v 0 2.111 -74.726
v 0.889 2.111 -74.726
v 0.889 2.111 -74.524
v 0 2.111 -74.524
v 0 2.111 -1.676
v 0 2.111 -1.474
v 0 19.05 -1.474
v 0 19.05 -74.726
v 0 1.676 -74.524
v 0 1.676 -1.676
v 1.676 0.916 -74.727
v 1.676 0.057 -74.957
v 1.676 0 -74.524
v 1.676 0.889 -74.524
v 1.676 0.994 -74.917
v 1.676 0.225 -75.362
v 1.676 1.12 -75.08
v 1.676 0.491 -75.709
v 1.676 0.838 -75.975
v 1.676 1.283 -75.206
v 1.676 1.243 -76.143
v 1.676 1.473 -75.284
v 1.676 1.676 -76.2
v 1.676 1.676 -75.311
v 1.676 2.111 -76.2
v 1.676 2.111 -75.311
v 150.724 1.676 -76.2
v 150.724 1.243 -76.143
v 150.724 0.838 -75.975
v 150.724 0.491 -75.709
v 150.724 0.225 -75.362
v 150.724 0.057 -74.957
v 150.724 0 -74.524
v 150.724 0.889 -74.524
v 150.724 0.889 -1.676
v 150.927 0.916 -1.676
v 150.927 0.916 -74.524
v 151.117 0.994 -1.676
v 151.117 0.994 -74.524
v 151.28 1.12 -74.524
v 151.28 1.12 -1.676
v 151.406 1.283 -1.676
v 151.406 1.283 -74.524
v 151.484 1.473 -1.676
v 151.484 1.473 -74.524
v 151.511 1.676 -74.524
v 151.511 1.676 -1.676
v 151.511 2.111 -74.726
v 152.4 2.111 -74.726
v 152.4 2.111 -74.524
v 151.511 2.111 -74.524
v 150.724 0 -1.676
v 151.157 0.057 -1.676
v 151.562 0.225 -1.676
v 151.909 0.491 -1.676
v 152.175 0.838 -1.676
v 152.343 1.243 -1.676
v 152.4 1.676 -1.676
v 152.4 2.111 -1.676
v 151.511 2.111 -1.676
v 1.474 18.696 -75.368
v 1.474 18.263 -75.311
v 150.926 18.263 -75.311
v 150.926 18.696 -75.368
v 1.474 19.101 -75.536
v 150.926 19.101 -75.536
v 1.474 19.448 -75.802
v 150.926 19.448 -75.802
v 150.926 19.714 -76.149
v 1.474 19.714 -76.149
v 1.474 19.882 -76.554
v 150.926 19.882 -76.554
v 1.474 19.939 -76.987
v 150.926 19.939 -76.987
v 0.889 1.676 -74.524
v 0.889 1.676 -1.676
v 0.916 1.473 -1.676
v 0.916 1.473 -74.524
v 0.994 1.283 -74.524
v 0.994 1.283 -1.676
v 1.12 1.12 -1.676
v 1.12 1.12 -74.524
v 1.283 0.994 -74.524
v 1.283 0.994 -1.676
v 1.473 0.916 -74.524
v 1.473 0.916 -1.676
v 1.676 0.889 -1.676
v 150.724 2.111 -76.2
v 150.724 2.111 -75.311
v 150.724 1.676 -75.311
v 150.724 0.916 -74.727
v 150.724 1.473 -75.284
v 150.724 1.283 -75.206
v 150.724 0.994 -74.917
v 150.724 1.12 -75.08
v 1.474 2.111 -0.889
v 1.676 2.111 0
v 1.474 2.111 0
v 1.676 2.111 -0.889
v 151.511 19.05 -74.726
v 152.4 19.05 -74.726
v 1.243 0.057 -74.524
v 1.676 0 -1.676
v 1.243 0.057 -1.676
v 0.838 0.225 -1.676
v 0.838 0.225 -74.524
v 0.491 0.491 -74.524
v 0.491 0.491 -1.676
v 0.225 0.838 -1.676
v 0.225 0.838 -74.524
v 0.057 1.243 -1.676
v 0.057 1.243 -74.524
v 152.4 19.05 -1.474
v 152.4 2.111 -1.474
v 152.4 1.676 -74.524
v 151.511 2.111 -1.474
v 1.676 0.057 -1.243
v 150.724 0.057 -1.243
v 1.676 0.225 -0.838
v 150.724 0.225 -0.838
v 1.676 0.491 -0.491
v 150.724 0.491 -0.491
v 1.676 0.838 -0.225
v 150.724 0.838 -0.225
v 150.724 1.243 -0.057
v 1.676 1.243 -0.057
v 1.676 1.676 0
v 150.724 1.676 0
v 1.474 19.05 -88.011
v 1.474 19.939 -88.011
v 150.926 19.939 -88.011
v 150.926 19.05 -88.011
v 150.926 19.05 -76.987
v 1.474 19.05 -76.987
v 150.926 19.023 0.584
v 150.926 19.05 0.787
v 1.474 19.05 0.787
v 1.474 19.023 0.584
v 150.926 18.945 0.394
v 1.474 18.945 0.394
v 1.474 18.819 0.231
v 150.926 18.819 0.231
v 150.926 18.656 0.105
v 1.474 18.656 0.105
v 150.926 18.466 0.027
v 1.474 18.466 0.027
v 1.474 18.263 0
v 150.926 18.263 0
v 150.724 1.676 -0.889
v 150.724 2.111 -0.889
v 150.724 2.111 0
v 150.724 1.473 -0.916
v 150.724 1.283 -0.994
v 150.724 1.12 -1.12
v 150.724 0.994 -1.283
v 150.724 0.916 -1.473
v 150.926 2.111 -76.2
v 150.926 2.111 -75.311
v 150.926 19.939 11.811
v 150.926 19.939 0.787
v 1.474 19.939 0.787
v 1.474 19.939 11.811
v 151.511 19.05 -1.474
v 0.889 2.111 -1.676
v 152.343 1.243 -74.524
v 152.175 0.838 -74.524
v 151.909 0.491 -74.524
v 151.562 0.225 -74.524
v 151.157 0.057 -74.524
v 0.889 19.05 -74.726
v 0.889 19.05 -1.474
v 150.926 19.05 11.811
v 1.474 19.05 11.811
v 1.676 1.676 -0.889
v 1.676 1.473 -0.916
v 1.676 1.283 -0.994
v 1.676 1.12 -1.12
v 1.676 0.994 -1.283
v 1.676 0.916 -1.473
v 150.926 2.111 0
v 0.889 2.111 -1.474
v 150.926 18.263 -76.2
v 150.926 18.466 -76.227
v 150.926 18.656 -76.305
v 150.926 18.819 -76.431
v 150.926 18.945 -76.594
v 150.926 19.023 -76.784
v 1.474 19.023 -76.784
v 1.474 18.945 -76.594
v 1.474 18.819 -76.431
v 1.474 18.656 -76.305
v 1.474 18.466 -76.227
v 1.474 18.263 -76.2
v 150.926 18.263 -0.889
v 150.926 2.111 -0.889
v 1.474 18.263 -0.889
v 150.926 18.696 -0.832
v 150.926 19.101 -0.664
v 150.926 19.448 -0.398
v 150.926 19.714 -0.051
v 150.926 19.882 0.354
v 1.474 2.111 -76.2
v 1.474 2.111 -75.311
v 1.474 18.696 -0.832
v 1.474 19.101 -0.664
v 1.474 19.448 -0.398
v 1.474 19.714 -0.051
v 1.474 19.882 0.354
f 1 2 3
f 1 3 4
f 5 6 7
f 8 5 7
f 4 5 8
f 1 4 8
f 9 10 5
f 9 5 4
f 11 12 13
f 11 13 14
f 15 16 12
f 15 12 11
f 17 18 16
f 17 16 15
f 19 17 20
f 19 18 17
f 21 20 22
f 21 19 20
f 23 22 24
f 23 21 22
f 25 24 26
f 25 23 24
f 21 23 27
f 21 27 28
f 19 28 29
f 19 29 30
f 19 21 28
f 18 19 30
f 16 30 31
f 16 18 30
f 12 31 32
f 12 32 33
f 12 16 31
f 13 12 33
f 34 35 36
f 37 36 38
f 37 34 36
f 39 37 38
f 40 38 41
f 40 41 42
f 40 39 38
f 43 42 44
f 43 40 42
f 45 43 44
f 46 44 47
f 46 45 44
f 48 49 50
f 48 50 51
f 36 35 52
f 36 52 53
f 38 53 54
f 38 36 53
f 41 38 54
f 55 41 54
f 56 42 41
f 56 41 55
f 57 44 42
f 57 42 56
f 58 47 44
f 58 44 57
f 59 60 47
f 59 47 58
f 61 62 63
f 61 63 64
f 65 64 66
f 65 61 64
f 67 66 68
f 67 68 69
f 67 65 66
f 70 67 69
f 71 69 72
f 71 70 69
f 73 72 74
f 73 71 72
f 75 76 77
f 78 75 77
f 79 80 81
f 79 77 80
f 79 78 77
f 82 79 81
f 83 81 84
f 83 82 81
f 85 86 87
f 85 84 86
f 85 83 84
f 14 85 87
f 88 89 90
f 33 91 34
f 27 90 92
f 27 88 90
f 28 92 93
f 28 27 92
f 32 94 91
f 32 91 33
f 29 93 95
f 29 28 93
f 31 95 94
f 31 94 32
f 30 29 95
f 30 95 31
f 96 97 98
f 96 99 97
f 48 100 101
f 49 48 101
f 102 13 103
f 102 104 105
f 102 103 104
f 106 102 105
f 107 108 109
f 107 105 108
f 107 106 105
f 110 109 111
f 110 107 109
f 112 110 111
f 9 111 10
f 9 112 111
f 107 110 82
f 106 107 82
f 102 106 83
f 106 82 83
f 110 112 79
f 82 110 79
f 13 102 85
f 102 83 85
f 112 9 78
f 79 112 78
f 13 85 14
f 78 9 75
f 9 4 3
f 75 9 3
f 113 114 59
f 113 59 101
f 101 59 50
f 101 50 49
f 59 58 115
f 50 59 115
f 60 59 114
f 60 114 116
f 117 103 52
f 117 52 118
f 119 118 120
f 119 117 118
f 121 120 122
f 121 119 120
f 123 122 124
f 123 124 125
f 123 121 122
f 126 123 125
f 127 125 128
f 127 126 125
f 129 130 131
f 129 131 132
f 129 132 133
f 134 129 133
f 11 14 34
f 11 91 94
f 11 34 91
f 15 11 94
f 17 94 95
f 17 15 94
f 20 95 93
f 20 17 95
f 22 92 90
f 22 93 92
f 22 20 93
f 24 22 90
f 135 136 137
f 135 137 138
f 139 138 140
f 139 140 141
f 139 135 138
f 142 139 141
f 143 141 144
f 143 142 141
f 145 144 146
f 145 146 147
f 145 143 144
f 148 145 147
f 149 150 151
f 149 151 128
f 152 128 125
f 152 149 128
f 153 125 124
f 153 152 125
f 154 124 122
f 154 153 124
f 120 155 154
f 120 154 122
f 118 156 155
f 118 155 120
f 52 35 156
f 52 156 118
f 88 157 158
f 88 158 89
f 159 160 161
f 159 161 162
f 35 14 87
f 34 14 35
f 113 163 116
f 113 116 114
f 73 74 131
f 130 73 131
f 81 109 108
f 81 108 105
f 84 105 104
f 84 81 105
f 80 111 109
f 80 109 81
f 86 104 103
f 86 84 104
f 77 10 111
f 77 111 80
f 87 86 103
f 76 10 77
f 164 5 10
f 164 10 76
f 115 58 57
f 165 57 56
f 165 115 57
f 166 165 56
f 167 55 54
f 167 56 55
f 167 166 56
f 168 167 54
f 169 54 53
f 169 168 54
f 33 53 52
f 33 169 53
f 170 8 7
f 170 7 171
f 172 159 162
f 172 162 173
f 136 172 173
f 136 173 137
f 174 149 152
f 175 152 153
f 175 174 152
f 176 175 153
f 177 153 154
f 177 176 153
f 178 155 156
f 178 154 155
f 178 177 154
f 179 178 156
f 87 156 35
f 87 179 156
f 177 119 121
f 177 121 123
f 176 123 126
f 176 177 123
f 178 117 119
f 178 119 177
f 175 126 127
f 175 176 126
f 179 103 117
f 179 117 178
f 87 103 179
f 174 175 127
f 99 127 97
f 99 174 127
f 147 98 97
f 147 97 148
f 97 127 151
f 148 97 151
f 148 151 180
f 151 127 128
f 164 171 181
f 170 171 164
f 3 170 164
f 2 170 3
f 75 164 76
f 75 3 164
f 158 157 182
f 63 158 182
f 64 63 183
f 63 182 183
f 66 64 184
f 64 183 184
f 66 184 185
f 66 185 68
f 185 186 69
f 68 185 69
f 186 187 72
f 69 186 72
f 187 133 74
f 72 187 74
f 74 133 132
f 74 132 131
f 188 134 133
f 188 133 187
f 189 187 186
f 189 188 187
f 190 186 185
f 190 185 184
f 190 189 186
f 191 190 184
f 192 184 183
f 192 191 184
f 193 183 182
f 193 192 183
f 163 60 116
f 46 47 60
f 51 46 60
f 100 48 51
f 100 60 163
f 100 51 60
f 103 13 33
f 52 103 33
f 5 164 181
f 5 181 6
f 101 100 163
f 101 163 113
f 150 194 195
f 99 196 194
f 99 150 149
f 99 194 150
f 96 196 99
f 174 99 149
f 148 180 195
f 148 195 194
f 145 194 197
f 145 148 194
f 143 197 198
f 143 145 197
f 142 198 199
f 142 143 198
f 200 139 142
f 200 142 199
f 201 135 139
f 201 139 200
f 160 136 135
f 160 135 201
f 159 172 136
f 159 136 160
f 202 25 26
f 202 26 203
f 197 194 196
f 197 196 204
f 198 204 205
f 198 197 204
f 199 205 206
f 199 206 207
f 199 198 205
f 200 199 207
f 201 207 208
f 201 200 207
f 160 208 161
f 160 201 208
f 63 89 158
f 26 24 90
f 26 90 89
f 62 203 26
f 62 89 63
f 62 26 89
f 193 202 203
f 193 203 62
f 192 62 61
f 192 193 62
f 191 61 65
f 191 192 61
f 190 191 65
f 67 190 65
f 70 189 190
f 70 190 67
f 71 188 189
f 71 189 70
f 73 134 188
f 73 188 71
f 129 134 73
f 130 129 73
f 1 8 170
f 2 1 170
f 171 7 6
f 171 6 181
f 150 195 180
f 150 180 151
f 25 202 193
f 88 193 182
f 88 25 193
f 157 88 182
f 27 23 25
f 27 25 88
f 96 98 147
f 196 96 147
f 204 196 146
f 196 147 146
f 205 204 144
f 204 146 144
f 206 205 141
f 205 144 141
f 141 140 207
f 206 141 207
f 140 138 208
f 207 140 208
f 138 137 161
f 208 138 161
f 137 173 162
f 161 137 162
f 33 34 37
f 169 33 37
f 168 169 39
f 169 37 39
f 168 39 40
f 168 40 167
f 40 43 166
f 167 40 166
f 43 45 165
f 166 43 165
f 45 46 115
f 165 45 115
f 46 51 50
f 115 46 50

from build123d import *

# Parameters (mm, degrees)
SKETCH1_W                      = 152.4
SKETCH1_H                      = 76.2
BOSS_EXTRUDE1_DEPTH            = 19.05
CONVERT_SOLID1_START           = -74.5236
CONVERT_SOLID1_DEPTH           = 72.8472
CONVERT_SOLID1_START_2         = -77
CONVERT_SOLID1_2_DEPTH         = 2.273736392
CONVERT_SOLID1_START_3         = -1.473736392
CONVERT_SOLID1_3_DEPTH         = 2.473736392
CONVERT_SOLID1_START_4         = -74.726263608
CONVERT_SOLID1_4_DEPTH         = 73.252527216
CONVERT_SOLID1_5_DEPTH         = 0.202663608
CONVERT_SOLID1_START_5         = -1.6764
CONVERT_SOLID1_6_DEPTH         = 0.202663608
CONVERT_SOLID1_START_6         = 1.473736392
CONVERT_SOLID1_7_DEPTH         = 149.452527216
EDGE_FLANGE1_STRIP_W           = 5.1308
EDGE_FLANGE1_STRIP_H           = 0.889
EDGE_FLANGE1_STRIP_CUT_DEPTH   = 149.452527217
EDGE_FLANGE1_STRIP_2_W         = 5.1308
EDGE_FLANGE1_STRIP_2_H         = 0.889
EDGE_FLANGE1_STRIP_CUT_2_DEPTH = 149.452527217
EDGE_FLANGE1_DEPTH             = 149.452527217
EDGE_FLANGE1_BEND_DEPTH        = 149.452527217


with BuildPart() as part:
    # Sketch1 → Boss-Extrude1 (new body)
    with BuildSketch(Plane(origin=(0, 0, 0), x_dir=(1, 0, 0), z_dir=(0, 1, 0))):
        with Locations((76.2, 38.1)):
            Rectangle(SKETCH1_W, SKETCH1_H)
    extrude(amount=BOSS_EXTRUDE1_DEPTH)

    # Convert-Solid1: read off the stored shape, not the designer's step
    # Convert-Solid1 outline → Convert-Solid1 (cut)
    with BuildSketch(Plane.XY.offset(CONVERT_SOLID1_START)):
        with BuildLine():
            Line((151.511, 19.05), (0.889, 19.05))
            Line((0.889, 19.05), (0.889, 1.6764))
            ThreePointArc((0.889, 1.6764), (1.11962412, 1.11962412), (1.6764, 0.889))
            Line((1.6764, 0.889), (150.7236, 0.889))
            ThreePointArc((150.7236, 0.889), (151.28037588, 1.11962412), (151.511, 1.6764))
            Line((151.511, 1.6764), (151.511, 19.05))
        make_face()
        with BuildLine():
            ThreePointArc((152.4, 1.6764), (151.908993808, 0.491006192), (150.7236, 0))
            Line((150.7236, 0), (152.4, 0))
            Line((152.4, 0), (152.4, 1.6764))
        make_face()
        with BuildLine():
            Line((0, 0), (1.6764, 0))
            ThreePointArc((1.6764, 0), (0.491006192, 0.491006192), (0, 1.6764))
            Line((0, 1.6764), (0, 0))
        make_face()
    extrude(amount=CONVERT_SOLID1_DEPTH, mode=Mode.SUBTRACT)

    # Convert-Solid1 2 outline → Convert-Solid1 2 (cut)
    with BuildSketch(Plane.XY.offset(CONVERT_SOLID1_START_2)):
        Polygon((150.926263608, 2.11106664), (150.7236, 2.11106664), (150.7236, 0), (152.4, 0), (152.4, 19.05), (150.926263608, 19.05), align=None)
        Polygon((1.473736392, 19.05), (0, 19.05), (0, 0), (1.6764, 0), (1.6764, 2.11106664), (1.473736392, 2.11106664), align=None)
    extrude(amount=CONVERT_SOLID1_2_DEPTH, mode=Mode.SUBTRACT)

    # Convert-Solid1 3 outline → Convert-Solid1 3 (cut)
    with BuildSketch(Plane.XY.offset(CONVERT_SOLID1_START_3)):
        Polygon((150.926263608, 2.11106664), (150.7236, 2.11106664), (150.7236, 0), (152.4, 0), (152.4, 19.05), (150.926263608, 19.05), align=None)
        Polygon((1.473736392, 19.05), (0, 19.05), (0, 0), (1.6764, 0), (1.6764, 2.11106664), (1.473736392, 2.11106664), align=None)
    extrude(amount=CONVERT_SOLID1_3_DEPTH, mode=Mode.SUBTRACT)

    # Convert-Solid1 4 outline → Convert-Solid1 4 (cut)
    with BuildSketch(Plane.XY.offset(CONVERT_SOLID1_START_4)):
        with BuildLine():
            Line((150.926263608, 2.11106664), (150.7236, 2.11106664))
            Line((150.7236, 2.11106664), (150.7236, 0.889))
            ThreePointArc((150.7236, 0.889), (151.28037588, 1.11962412), (151.511, 1.6764))
            Line((151.511, 1.6764), (151.511, 19.05))
            Line((151.511, 19.05), (150.926263608, 19.05))
            Line((150.926263608, 19.05), (150.926263608, 2.11106664))
        make_face()
        with BuildLine():
            ThreePointArc((152.4, 1.6764), (151.908993808, 0.491006192), (150.7236, 0))
            Line((150.7236, 0), (152.4, 0))
            Line((152.4, 0), (152.4, 1.6764))
        make_face()
        with BuildLine():
            ThreePointArc((0.889, 1.6764), (1.11962412, 1.11962412), (1.6764, 0.889))
            Line((1.6764, 0.889), (1.6764, 2.11106664))
            Line((1.6764, 2.11106664), (1.473736392, 2.11106664))
            Line((1.473736392, 2.11106664), (1.473736392, 19.05))
            Line((1.473736392, 19.05), (0.889, 19.05))
            Line((0.889, 19.05), (0.889, 1.6764))
        make_face()
        with BuildLine():
            Line((0, 0), (1.6764, 0))
            ThreePointArc((1.6764, 0), (0.491006192, 0.491006192), (0, 1.6764))
            Line((0, 1.6764), (0, 0))
        make_face()
    extrude(amount=CONVERT_SOLID1_4_DEPTH, mode=Mode.SUBTRACT)

    # Convert-Solid1 5 outline → Convert-Solid1 5 (cut)
    with BuildSketch(Plane.XY.offset(CONVERT_SOLID1_START_4)):
        with BuildLine():
            ThreePointArc((151.511, 1.6764), (151.28037588, 1.11962412), (150.7236, 0.889))
            Line((150.7236, 0.889), (150.7236, 0))
            ThreePointArc((150.7236, 0), (151.908993808, 0.491006192), (152.4, 1.6764))
            Line((152.4, 1.6764), (152.4, 2.11106664))
            Line((152.4, 2.11106664), (151.511, 2.11106664))
            Line((151.511, 2.11106664), (151.511, 1.6764))
        make_face()
        with BuildLine():
            Line((1.6764, 0), (1.6764, 0.889))
            ThreePointArc((1.6764, 0.889), (1.11962412, 1.11962412), (0.889, 1.6764))
            Line((0.889, 1.6764), (0.889, 2.11106664))
            Line((0.889, 2.11106664), (0, 2.11106664))
            Line((0, 2.11106664), (0, 1.6764))
            ThreePointArc((0, 1.6764), (0.491006192, 0.491006192), (1.6764, 0))
        make_face()
    extrude(amount=CONVERT_SOLID1_5_DEPTH, mode=Mode.SUBTRACT)

    # Convert-Solid1 6 outline → Convert-Solid1 6 (cut)
    with BuildSketch(Plane.XY.offset(CONVERT_SOLID1_START_5)):
        with BuildLine():
            ThreePointArc((151.511, 1.6764), (151.28037588, 1.11962412), (150.7236, 0.889))
            Line((150.7236, 0.889), (150.7236, 0))
            ThreePointArc((150.7236, 0), (151.908993808, 0.491006192), (152.4, 1.6764))
            Line((152.4, 1.6764), (152.4, 2.11106664))
            Line((152.4, 2.11106664), (151.511, 2.11106664))
            Line((151.511, 2.11106664), (151.511, 1.6764))
        make_face()
        with BuildLine():
            Line((1.6764, 0), (1.6764, 0.889))
            ThreePointArc((1.6764, 0.889), (1.11962412, 1.11962412), (0.889, 1.6764))
            Line((0.889, 1.6764), (0.889, 2.11106664))
            Line((0.889, 2.11106664), (0, 2.11106664))
            Line((0, 2.11106664), (0, 1.6764))
            ThreePointArc((0, 1.6764), (0.491006192, 0.491006192), (1.6764, 0))
        make_face()
    extrude(amount=CONVERT_SOLID1_6_DEPTH, mode=Mode.SUBTRACT)

    # Convert-Solid1 7 outline → Convert-Solid1 7 (cut)
    with BuildSketch(Plane.YZ.offset(CONVERT_SOLID1_START_6)):
        with BuildLine():
            Line((0, 0), (0, -1.6764))
            ThreePointArc((0, -1.6764), (0.491006192, -0.491006192), (1.6764, 0))
            Line((1.6764, 0), (0, 0))
        make_face()
        with BuildLine():
            ThreePointArc((1.6764, -76.2), (0.491006192, -75.708993808), (0, -74.5236))
            Line((0, -74.5236), (0, -76.2))
            Line((0, -76.2), (1.6764, -76.2))
        make_face()
        with BuildLine():
            Line((19.05, -74.5236), (0.889, -74.5236))
            ThreePointArc((0.889, -74.5236), (1.11962412, -75.08037588), (1.6764, -75.311))
            Line((1.6764, -75.311), (19.05, -75.311))
            Line((19.05, -75.311), (19.05, -74.5236))
        make_face()
        with BuildLine():
            Line((0.889, -1.6764), (19.05, -1.6764))
            Line((19.05, -1.6764), (19.05, -0.889))
            Line((19.05, -0.889), (1.6764, -0.889))
            ThreePointArc((1.6764, -0.889), (1.11962412, -1.11962412), (0.889, -1.6764))
        make_face()
    extrude(amount=CONVERT_SOLID1_7_DEPTH, mode=Mode.SUBTRACT)

    # Edge-Flange1: sheet metal written as solids
    # Edge-Flange1 strip (on a plane across the edge) → Edge-Flange1 strip cut (cut)
    with BuildSketch(Plane(origin=(150.926263608, 19.05, 0), x_dir=(0, -1, 0), z_dir=(-1, 0, 0))):
        with Locations((-1.778, -0.4445)):
            Rectangle(EDGE_FLANGE1_STRIP_W, EDGE_FLANGE1_STRIP_H)
    extrude(amount=EDGE_FLANGE1_STRIP_CUT_DEPTH, mode=Mode.SUBTRACT)

    # Edge-Flange1 strip 2 (on a plane across the edge) → Edge-Flange1 strip cut 2 (cut)
    with BuildSketch(Plane(origin=(1.473736392, 19.05, -76.2), x_dir=(0, -1, 0), z_dir=(1, 0, 0))):
        with Locations((-1.778, -0.4445)):
            Rectangle(EDGE_FLANGE1_STRIP_2_W, EDGE_FLANGE1_STRIP_2_H)
    extrude(amount=EDGE_FLANGE1_STRIP_CUT_2_DEPTH, mode=Mode.SUBTRACT)

    # Edge-Flange1 section (on a plane across the edge) → Edge-Flange1 (add)
    with BuildSketch(Plane(origin=(150.926263608, 19.05, 0), x_dir=(0, -1, 0), z_dir=(-1, 0, 0))):
        with BuildLine():
            Line((-0.889, 0.7874), (-0.889, 11.811))
            Line((-0.889, 11.811), (0, 11.811))
            Line((0, 11.811), (0, 0.7874))
            ThreePointArc((0, 0.7874), (0.23062412, 0.23062412), (0.7874, 0))
            Line((0.7874, 0), (0.7874, -0.889))
            ThreePointArc((0.7874, -0.889), (-0.397993808, -0.397993808), (-0.889, 0.7874))
        make_face()
    extrude(amount=EDGE_FLANGE1_DEPTH)

    # Edge-Flange1 section 2 (on a plane across the edge) → Edge-Flange1 bend (add)
    with BuildSketch(Plane(origin=(1.473736392, 19.05, -76.2), x_dir=(0, -1, 0), z_dir=(1, 0, 0))):
        with BuildLine():
            Line((-0.889, 0.7874), (-0.889, 11.811))
            Line((-0.889, 11.811), (0, 11.811))
            Line((0, 11.811), (0, 0.7874))
            ThreePointArc((0, 0.7874), (0.23062412, 0.23062412), (0.7874, 0))
            Line((0.7874, 0), (0.7874, -0.889))
            ThreePointArc((0.7874, -0.889), (-0.397993808, -0.397993808), (-0.889, 0.7874))
        make_face()
    extrude(amount=EDGE_FLANGE1_BEND_DEPTH)


solid = part.part
